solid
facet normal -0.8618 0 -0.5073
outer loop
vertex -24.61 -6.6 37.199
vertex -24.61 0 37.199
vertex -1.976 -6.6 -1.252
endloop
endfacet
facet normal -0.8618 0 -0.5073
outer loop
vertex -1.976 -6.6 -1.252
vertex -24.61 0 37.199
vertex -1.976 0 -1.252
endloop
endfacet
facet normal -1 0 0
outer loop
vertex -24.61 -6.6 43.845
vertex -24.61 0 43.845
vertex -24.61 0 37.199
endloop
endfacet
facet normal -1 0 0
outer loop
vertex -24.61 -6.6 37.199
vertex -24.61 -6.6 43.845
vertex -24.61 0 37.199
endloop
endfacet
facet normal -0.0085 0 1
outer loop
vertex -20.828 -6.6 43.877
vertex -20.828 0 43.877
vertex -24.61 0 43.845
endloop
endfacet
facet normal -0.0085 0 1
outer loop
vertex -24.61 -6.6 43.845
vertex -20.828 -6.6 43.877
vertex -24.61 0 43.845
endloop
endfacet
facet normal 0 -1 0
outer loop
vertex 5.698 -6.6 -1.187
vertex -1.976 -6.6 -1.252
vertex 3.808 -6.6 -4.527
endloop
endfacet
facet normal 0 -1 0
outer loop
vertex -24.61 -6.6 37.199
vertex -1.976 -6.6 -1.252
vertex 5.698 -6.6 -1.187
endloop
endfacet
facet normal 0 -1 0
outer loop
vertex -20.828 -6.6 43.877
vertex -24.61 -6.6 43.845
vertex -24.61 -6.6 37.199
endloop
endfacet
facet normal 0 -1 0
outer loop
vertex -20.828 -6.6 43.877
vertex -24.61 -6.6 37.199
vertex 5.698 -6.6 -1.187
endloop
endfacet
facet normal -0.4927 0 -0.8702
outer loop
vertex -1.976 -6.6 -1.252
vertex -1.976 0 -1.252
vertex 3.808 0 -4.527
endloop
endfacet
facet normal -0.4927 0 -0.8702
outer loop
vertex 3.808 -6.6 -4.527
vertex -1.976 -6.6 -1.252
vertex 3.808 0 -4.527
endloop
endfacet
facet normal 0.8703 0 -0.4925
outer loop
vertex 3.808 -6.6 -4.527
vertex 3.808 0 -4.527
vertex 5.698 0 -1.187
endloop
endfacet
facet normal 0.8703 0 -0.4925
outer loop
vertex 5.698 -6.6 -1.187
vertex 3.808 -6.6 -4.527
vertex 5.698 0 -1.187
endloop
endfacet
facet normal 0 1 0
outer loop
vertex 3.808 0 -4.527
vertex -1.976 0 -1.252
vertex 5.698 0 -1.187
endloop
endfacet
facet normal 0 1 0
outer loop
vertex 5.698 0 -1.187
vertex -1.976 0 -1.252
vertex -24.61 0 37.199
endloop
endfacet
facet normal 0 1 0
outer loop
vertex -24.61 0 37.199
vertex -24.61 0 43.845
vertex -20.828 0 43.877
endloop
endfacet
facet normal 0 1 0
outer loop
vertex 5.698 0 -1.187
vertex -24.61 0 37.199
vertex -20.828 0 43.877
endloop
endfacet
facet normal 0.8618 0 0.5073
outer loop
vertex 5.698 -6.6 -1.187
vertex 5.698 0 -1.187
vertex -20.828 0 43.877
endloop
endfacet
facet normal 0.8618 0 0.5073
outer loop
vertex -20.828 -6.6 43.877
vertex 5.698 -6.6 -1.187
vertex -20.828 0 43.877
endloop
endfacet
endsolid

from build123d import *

# Parameters (mm, degrees)
F1_DEPTH = 6.6


with BuildPart() as f1:
    # F0 (on Front) → F1 (new body)
    with BuildSketch(Plane.XZ):
        Polygon((-20.828086, 43.877387), (-24.60951, 37.198508), (-1.976367, -1.251827), (5.698425, -1.187197), align=None)
        Polygon((-24.60951, 43.845072), (-24.60951, 37.198508), (-20.828086, 43.877387), align=None)
        Polygon((5.698425, -1.187197), (-1.976367, -1.251827), (3.807712, -4.526636), align=None)
    extrude(amount=F1_DEPTH)


solid = f1.part
